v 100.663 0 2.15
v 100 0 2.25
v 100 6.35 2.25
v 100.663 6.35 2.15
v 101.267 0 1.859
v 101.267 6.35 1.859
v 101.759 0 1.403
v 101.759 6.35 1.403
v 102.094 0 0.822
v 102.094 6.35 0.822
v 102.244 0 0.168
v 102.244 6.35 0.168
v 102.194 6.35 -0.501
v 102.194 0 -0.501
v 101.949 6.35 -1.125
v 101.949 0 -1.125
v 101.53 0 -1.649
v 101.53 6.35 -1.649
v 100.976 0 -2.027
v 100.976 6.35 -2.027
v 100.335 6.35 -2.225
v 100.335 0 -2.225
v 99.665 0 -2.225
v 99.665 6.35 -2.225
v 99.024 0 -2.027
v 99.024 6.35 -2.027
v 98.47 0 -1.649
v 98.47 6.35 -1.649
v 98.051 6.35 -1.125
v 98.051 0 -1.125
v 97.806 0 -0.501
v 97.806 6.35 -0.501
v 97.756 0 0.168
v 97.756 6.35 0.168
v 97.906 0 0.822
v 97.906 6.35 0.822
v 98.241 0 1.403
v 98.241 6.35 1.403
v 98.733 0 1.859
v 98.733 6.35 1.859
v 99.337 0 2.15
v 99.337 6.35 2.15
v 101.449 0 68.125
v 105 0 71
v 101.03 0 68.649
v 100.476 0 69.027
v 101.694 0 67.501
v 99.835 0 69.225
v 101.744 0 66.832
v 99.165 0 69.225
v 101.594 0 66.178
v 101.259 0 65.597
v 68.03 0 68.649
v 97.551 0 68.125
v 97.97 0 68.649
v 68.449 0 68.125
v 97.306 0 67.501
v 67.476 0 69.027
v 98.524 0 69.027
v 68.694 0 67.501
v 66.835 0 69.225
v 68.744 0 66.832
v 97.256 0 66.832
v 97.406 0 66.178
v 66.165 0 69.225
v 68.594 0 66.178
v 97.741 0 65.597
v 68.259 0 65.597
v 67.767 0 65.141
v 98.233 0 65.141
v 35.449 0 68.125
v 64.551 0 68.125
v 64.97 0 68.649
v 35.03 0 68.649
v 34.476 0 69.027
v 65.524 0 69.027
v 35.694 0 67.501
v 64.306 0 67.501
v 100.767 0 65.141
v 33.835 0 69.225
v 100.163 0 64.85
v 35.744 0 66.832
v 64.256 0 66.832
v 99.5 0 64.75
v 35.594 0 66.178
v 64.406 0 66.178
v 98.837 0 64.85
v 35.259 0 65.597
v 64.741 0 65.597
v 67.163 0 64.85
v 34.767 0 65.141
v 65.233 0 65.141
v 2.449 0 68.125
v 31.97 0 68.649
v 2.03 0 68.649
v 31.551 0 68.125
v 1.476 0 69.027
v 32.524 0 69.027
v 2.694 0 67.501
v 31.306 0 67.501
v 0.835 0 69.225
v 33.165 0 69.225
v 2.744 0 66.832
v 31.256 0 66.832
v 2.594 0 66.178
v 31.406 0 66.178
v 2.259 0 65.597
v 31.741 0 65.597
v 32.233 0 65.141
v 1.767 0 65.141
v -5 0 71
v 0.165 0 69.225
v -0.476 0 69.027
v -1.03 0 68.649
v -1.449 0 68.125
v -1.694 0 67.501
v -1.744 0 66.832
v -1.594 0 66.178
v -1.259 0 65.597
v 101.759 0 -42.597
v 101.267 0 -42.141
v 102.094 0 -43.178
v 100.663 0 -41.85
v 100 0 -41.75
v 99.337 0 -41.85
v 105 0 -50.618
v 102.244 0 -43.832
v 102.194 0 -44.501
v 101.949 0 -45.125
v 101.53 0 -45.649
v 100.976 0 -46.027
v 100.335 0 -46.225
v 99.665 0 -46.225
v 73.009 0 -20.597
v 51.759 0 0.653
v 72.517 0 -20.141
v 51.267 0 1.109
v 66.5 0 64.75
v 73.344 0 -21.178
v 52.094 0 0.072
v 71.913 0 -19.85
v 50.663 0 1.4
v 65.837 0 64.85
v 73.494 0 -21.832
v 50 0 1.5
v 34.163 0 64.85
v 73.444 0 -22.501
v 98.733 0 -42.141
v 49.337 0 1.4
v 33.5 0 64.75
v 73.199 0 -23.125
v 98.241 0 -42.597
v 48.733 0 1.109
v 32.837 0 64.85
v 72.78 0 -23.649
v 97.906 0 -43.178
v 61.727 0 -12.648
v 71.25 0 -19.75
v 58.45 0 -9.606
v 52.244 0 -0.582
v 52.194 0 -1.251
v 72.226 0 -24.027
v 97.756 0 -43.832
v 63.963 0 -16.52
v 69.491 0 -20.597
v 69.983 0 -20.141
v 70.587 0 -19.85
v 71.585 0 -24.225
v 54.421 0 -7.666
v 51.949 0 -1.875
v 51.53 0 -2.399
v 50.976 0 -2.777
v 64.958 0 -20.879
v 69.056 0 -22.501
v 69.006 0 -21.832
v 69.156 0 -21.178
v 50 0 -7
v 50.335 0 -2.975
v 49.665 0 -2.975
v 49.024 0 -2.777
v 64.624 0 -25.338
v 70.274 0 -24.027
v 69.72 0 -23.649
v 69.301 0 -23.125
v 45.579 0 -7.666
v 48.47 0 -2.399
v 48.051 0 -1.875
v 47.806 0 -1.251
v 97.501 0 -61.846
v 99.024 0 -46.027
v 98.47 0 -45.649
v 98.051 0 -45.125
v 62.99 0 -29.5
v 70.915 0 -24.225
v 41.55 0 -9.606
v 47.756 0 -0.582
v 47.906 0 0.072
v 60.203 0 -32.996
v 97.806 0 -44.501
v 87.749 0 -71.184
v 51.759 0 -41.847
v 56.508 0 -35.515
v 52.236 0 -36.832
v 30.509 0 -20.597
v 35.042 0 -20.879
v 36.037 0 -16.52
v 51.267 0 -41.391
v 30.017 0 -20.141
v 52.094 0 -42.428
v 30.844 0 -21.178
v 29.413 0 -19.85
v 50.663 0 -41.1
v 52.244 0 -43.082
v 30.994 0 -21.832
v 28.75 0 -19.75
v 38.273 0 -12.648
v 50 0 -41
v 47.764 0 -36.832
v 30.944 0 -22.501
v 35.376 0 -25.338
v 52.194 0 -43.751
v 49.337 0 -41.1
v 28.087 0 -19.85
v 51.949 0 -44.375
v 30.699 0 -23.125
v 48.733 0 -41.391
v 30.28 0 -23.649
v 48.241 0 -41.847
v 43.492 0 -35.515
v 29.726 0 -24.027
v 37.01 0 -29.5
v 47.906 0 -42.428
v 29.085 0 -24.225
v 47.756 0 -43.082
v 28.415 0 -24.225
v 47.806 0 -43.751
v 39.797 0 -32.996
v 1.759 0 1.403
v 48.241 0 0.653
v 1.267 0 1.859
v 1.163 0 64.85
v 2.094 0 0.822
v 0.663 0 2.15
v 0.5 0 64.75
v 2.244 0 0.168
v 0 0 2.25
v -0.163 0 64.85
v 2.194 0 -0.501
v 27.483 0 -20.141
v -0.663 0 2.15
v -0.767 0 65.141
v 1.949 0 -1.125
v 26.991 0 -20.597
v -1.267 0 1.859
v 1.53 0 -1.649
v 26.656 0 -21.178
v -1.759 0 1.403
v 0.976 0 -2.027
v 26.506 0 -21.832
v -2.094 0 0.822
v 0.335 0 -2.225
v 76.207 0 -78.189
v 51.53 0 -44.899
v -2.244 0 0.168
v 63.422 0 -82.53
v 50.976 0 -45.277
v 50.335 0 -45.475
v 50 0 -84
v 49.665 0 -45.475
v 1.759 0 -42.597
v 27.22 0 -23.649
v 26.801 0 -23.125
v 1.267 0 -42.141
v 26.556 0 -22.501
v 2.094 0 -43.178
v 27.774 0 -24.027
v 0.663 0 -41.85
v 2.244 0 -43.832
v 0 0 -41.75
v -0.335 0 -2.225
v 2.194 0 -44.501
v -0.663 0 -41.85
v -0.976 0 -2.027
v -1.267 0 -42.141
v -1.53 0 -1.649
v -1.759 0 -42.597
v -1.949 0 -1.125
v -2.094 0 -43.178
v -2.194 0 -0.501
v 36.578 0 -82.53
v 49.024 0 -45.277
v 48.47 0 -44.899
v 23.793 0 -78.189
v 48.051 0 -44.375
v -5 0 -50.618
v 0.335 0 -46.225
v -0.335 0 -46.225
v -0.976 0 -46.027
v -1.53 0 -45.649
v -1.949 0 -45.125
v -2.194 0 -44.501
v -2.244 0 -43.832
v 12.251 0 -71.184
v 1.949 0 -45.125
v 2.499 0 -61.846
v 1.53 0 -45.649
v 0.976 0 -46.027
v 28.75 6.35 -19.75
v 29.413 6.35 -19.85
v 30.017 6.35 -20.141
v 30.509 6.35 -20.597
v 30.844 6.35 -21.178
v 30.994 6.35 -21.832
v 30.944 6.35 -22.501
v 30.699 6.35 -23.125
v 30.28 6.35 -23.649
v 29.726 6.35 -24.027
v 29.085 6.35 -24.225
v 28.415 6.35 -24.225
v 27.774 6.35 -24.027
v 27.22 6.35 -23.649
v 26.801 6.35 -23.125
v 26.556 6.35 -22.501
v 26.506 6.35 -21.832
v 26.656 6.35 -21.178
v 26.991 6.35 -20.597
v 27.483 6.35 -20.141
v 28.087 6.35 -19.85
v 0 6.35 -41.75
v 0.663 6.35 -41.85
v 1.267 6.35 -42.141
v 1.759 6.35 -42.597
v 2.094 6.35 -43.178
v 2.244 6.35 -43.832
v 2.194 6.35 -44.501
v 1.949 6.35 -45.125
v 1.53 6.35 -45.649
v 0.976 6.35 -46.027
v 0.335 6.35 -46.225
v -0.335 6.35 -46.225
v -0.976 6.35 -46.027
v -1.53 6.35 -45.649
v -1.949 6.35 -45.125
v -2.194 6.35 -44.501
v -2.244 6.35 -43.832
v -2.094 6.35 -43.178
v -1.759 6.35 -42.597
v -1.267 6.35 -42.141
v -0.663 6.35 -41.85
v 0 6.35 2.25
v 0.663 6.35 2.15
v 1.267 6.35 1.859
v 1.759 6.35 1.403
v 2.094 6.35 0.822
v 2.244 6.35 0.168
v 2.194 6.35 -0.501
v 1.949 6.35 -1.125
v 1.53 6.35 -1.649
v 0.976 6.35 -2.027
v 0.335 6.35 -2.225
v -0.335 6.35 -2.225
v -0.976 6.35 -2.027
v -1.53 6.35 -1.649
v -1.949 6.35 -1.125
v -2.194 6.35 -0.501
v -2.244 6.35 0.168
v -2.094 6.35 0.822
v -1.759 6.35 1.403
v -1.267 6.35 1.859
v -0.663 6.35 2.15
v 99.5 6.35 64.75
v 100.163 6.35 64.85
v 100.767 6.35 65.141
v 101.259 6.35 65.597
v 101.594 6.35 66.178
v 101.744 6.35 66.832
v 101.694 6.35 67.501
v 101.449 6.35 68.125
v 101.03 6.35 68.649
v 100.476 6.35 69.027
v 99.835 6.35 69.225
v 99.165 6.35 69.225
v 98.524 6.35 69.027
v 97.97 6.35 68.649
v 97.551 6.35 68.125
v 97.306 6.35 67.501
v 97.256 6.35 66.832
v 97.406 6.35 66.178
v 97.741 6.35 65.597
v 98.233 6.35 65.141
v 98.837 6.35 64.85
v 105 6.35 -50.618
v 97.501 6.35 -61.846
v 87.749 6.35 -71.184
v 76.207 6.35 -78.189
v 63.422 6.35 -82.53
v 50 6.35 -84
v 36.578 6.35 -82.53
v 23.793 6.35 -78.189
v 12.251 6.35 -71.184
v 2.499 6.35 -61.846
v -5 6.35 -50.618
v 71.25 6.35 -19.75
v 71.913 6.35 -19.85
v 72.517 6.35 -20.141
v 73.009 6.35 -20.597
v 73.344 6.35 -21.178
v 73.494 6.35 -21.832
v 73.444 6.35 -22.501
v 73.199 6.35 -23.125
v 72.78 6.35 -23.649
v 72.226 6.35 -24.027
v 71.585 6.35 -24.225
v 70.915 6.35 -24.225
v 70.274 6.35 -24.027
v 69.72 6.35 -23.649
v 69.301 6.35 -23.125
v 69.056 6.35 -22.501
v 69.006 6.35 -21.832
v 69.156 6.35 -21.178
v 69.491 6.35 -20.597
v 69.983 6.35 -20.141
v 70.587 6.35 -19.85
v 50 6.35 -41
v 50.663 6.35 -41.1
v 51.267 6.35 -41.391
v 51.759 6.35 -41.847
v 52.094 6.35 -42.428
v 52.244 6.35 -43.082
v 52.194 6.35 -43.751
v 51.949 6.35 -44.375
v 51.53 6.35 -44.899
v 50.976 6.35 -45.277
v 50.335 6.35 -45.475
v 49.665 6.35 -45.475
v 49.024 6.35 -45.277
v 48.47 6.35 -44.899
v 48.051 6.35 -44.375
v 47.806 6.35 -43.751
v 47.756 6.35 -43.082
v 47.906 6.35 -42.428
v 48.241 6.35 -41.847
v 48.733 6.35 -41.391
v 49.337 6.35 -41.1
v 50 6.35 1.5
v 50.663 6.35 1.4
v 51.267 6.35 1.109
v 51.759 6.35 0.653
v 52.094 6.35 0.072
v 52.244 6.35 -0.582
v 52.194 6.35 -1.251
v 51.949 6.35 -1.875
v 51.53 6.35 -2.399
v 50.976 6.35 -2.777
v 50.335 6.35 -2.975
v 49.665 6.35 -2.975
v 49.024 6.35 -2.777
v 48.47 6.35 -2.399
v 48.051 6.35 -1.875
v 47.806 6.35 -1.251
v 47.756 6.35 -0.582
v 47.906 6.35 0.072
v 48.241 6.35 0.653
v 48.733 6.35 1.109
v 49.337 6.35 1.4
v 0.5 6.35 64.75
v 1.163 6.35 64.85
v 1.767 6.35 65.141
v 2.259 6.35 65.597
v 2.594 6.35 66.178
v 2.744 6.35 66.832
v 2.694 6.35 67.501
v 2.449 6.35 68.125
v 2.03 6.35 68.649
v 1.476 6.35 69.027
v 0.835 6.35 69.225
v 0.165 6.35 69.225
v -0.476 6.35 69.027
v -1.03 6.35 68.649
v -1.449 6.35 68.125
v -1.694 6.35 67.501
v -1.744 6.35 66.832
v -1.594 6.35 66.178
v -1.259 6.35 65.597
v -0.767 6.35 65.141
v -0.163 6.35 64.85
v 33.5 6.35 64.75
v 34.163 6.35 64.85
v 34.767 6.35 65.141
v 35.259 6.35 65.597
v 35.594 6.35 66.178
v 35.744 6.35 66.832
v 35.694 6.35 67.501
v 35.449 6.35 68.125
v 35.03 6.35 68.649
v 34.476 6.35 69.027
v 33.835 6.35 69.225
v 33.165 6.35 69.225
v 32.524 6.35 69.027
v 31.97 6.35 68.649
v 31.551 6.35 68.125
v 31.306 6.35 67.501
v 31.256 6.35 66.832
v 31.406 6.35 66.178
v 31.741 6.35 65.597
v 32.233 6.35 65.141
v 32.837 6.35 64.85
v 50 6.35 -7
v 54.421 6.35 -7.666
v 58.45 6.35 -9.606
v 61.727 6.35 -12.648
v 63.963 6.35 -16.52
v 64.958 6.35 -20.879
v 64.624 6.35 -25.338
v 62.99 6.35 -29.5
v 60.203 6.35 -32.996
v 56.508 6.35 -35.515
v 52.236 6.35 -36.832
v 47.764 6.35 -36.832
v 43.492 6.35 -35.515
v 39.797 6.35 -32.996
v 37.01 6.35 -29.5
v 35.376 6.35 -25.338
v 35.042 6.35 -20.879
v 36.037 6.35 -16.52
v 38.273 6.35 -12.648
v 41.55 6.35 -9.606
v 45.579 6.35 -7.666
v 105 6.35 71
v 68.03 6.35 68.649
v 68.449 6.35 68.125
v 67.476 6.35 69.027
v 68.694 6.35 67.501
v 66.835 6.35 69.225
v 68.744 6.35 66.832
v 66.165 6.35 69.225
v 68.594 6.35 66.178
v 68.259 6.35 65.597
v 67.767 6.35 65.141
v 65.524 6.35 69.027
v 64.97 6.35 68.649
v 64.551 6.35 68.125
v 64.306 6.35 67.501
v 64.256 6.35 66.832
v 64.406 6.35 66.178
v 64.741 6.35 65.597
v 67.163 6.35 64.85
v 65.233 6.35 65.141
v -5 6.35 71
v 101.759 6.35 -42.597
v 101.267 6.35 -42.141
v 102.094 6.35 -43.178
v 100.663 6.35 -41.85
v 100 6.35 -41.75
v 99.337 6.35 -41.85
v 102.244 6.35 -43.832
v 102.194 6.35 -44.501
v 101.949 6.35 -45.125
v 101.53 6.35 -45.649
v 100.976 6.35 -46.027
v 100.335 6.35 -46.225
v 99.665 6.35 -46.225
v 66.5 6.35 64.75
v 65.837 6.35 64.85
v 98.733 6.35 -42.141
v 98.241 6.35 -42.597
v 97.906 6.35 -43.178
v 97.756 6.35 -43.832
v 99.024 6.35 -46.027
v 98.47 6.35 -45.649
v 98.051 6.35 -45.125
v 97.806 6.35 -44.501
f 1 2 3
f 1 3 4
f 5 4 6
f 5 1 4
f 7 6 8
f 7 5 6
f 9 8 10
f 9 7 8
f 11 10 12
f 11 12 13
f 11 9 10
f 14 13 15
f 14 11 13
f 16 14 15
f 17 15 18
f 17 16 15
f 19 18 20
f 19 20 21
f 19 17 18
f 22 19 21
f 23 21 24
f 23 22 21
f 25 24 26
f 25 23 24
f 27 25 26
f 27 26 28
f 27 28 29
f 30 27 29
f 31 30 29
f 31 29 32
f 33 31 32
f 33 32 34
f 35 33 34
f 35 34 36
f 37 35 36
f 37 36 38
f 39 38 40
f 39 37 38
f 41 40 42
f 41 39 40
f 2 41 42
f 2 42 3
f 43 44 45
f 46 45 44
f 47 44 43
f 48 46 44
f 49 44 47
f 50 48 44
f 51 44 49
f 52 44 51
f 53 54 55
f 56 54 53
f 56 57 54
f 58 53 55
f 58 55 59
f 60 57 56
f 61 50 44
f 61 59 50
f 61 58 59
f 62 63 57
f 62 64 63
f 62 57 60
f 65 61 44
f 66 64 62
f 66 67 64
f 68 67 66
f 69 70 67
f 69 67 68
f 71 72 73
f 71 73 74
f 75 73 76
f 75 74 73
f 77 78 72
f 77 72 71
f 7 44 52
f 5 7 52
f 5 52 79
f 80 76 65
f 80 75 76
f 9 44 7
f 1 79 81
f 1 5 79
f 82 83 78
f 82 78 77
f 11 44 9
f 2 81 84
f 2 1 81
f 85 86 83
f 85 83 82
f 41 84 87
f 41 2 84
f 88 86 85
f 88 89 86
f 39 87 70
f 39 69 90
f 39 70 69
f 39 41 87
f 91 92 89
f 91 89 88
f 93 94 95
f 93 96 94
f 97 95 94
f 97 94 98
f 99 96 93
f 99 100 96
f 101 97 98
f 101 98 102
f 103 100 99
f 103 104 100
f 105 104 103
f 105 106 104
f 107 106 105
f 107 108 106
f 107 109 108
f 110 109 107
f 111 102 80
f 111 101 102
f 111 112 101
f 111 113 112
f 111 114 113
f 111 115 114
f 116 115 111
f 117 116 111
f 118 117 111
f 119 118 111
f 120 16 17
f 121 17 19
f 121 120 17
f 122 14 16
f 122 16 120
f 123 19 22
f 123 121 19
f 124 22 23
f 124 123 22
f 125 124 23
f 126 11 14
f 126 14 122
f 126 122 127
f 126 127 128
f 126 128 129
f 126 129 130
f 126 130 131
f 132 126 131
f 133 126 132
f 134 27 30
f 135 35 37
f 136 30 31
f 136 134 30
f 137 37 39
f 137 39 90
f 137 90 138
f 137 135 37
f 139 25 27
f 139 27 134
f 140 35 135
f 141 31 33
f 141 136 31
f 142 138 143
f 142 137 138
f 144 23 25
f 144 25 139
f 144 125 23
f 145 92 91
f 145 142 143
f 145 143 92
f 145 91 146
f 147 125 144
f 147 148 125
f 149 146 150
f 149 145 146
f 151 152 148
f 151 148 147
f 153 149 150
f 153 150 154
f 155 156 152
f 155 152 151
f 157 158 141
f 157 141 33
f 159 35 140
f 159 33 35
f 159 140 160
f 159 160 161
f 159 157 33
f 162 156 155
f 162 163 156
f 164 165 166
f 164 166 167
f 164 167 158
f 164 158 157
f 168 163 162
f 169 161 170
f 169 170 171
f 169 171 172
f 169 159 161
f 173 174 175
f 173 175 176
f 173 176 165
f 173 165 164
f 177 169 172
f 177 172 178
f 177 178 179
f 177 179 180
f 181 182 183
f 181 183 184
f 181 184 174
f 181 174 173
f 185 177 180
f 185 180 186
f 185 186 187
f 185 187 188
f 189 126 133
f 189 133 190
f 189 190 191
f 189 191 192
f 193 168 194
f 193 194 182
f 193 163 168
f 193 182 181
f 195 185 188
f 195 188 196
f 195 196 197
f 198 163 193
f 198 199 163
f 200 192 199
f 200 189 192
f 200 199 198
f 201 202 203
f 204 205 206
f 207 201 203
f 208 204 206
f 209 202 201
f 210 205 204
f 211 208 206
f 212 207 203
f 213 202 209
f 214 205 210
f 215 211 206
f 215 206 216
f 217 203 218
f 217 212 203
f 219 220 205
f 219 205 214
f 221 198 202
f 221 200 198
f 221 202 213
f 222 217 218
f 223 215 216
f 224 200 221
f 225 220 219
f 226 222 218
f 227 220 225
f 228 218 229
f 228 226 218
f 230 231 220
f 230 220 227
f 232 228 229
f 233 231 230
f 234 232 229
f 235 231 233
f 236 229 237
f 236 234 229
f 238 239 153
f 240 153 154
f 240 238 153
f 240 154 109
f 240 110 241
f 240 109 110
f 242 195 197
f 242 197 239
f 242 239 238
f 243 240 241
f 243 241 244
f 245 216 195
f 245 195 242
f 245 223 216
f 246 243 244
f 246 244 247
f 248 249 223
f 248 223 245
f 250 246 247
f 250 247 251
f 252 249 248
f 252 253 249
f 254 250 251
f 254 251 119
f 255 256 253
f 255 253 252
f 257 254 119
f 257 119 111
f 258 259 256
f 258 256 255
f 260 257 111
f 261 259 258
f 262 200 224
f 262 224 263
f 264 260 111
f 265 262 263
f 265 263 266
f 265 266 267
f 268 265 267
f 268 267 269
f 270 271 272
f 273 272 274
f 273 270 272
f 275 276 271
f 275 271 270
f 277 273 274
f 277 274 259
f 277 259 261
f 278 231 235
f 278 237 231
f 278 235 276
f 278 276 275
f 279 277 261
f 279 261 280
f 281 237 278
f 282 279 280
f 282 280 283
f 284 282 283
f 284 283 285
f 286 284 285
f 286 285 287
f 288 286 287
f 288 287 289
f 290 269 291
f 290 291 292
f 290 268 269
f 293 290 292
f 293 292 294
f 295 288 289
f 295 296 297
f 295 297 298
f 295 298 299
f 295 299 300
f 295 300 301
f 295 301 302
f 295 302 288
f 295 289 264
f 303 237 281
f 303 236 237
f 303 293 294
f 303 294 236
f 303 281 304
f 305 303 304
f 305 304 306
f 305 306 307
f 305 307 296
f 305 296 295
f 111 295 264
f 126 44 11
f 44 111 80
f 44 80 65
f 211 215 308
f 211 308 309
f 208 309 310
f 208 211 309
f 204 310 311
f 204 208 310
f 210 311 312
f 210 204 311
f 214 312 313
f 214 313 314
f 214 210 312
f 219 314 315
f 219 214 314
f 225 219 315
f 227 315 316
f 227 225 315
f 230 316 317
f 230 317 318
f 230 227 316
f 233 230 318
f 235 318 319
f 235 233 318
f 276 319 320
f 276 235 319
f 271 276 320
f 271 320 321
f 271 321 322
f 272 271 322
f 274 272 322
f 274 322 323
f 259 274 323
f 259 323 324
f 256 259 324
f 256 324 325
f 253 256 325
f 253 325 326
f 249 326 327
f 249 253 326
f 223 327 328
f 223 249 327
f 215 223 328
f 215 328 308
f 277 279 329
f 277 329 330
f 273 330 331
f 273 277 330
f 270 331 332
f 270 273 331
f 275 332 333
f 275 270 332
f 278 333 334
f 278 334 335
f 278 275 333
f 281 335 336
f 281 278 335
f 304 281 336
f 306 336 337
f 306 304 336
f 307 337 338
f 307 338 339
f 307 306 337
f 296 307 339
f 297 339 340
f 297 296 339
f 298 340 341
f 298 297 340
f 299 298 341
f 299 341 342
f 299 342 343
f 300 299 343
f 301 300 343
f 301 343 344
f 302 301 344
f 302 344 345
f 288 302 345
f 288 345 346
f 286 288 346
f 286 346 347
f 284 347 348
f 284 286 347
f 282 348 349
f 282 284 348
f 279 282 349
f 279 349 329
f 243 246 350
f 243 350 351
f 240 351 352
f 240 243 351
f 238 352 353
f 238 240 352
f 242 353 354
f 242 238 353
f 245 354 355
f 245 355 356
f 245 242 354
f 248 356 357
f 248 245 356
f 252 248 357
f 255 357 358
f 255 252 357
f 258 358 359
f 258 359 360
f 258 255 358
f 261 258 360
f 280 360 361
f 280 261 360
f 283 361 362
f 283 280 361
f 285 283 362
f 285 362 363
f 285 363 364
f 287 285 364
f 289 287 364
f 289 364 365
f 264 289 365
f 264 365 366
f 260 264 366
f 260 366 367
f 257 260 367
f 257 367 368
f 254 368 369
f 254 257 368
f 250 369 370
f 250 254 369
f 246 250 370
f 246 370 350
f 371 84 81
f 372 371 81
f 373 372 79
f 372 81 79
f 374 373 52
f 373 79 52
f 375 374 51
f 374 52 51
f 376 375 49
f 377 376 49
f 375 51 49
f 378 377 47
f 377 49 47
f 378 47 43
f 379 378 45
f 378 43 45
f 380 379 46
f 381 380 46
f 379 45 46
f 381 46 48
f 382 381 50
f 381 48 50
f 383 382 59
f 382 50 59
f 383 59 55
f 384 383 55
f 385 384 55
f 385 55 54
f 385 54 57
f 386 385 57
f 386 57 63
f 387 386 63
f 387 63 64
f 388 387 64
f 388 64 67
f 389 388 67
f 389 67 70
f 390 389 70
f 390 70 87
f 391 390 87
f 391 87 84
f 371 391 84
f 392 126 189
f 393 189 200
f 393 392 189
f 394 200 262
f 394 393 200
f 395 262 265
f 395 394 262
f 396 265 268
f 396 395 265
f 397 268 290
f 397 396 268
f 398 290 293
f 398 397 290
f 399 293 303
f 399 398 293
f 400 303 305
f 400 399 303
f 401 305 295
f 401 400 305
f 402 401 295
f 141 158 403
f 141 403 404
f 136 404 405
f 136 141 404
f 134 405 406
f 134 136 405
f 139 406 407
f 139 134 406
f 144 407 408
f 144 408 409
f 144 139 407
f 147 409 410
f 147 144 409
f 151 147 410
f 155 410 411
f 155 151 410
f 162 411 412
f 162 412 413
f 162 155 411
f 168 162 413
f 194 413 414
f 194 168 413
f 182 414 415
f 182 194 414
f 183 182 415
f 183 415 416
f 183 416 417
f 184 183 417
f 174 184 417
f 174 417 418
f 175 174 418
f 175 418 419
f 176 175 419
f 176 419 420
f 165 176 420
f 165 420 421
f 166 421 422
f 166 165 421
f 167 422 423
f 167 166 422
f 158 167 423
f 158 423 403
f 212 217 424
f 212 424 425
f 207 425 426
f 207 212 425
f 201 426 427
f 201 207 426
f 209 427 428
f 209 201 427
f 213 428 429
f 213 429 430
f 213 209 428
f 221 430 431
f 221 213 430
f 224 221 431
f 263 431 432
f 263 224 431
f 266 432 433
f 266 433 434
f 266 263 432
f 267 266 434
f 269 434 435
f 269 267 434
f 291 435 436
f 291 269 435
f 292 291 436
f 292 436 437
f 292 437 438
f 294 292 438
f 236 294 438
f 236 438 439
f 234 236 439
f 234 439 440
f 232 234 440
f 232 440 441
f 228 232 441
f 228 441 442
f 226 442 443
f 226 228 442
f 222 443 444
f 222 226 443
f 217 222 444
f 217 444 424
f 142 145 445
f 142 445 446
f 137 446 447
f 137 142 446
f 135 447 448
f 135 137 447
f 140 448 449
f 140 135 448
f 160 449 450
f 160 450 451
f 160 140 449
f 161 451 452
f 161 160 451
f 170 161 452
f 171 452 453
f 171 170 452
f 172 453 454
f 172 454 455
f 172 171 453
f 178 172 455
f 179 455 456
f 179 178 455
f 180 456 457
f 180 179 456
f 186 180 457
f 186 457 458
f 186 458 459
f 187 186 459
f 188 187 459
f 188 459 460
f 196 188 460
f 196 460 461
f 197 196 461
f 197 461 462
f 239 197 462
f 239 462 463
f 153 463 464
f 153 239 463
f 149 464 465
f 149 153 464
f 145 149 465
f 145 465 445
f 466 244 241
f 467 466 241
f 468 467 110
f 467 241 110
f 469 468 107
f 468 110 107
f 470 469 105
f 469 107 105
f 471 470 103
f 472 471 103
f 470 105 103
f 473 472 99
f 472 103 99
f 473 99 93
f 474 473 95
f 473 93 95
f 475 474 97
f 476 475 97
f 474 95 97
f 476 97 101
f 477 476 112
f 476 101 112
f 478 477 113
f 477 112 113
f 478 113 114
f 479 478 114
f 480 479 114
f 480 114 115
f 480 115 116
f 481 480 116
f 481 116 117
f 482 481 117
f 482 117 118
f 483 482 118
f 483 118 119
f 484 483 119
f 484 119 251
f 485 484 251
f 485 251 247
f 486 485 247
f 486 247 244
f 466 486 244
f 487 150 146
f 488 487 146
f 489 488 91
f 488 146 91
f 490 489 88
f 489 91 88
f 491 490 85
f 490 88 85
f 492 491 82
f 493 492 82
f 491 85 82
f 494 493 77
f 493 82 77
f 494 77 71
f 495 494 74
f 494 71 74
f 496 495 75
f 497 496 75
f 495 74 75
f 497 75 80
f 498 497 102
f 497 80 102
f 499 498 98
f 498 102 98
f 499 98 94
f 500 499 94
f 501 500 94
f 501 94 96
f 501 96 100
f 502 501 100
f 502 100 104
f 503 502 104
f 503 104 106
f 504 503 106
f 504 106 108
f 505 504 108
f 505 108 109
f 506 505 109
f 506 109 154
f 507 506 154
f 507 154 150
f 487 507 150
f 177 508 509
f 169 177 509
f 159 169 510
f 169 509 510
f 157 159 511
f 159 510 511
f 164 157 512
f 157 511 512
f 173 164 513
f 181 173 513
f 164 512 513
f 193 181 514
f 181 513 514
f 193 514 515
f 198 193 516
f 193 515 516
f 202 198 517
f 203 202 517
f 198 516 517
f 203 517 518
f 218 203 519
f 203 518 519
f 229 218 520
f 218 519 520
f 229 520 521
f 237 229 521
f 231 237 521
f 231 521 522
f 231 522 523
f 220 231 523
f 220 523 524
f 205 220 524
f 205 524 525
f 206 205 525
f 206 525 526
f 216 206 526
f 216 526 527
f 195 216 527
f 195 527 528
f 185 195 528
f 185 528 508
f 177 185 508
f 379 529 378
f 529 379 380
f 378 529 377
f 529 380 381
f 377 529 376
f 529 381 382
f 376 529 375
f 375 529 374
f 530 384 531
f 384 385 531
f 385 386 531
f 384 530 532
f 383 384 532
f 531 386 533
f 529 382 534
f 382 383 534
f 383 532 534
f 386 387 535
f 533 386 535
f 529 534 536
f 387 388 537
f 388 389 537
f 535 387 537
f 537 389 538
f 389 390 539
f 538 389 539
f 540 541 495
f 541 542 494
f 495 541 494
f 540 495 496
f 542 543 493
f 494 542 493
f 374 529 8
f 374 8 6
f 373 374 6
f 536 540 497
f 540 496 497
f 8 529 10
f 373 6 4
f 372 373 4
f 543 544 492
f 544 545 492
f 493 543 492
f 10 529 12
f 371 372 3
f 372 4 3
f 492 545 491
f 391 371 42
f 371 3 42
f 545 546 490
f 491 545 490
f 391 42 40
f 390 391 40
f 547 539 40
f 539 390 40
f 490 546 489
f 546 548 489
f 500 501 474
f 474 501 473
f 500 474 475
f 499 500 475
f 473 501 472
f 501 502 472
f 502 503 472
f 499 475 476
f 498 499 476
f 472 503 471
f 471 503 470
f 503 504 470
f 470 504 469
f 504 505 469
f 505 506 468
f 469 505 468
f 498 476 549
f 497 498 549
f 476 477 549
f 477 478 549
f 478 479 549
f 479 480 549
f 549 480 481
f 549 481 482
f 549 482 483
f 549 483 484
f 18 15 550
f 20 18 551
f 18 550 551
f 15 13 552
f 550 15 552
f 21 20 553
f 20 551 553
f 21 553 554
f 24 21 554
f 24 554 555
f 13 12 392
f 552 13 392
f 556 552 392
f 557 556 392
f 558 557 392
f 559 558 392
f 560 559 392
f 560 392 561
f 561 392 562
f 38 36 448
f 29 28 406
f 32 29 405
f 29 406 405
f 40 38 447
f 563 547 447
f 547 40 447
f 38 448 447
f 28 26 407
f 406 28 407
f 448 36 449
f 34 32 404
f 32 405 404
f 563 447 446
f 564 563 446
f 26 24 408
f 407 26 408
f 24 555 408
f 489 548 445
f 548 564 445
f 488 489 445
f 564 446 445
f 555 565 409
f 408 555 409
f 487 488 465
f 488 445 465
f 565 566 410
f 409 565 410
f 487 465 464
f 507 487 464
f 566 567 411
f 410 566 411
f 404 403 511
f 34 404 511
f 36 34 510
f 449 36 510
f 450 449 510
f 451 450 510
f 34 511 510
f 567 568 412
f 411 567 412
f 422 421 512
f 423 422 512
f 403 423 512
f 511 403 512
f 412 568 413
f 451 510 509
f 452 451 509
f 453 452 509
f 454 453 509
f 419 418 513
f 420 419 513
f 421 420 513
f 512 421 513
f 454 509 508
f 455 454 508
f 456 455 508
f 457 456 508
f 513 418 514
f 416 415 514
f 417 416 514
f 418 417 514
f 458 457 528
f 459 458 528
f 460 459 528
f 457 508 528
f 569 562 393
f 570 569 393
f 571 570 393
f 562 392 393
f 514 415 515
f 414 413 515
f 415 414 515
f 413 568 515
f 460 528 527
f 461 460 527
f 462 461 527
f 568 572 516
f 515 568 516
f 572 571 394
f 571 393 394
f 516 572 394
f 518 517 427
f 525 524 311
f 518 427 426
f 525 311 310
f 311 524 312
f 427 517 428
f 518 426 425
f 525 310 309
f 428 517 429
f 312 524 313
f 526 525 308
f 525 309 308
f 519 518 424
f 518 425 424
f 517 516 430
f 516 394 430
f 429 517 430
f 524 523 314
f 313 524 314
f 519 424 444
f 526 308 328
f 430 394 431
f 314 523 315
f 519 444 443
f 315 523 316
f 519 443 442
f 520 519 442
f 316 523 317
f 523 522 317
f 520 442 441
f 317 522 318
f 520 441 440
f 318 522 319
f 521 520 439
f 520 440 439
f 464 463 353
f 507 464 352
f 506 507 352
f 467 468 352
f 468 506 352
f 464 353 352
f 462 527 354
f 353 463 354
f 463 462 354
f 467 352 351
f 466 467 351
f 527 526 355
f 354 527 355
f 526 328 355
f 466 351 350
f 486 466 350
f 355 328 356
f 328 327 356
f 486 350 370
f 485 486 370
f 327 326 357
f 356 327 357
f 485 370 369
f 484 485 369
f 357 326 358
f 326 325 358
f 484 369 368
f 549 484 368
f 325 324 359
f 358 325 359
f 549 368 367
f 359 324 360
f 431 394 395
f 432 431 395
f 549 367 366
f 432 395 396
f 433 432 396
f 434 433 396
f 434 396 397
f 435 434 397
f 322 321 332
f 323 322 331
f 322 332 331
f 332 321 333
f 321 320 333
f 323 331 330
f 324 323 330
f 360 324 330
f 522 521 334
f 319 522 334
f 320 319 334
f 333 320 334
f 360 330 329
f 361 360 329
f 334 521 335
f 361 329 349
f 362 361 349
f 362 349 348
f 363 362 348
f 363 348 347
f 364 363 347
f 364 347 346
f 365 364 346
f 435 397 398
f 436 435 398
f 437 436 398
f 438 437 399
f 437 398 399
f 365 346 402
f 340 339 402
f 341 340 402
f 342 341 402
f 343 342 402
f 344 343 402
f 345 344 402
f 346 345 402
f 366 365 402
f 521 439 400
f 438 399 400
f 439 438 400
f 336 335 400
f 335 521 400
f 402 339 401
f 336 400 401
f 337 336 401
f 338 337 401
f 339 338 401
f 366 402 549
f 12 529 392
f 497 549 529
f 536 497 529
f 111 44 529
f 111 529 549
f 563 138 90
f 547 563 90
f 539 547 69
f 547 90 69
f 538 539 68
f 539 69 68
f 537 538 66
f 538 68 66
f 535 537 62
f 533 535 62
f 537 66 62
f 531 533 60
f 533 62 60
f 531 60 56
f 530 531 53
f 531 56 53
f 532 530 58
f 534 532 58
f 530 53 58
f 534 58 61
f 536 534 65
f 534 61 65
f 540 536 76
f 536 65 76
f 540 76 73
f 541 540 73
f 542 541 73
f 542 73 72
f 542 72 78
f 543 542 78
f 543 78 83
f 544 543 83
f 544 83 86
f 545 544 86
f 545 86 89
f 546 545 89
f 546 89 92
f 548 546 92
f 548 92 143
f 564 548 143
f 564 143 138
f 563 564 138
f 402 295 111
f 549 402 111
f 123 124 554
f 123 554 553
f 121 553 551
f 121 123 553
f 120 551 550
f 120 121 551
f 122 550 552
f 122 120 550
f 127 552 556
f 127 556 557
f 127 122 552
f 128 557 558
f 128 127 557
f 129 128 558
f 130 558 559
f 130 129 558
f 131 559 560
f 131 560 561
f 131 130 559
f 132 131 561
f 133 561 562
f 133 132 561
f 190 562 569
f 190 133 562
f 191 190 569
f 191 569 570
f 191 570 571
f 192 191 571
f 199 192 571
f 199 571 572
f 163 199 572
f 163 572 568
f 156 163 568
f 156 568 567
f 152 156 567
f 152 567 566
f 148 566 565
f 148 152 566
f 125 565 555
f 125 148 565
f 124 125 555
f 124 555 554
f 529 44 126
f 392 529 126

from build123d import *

# Parameters (mm, degrees)
SKETCH1_R           = 2.25
BOSS_EXTRUDE1_DEPTH = 6.35
SKETCH2_R           = 15
CUT_EXTRUDE1_DEPTH  = 10
CUT_EXTRUDE2_DEPTH  = 60
SKETCH4_R           = 2.25
CUT_EXTRUDE3_DEPTH  = 10


with BuildPart() as part:
    # Sketch1 → Boss-Extrude1 (new body)
    with BuildSketch(Plane(origin=(0, 0, 0), x_dir=(1, 0, 0), z_dir=(0, 1, 0))):
        Polygon((-5, -16), (-5, 84), (105, 84), (105, -16), (105, -71), (-5, -71), align=None)
        with Locations(Location((0, 0, 0), (0, 0, 270))):
            Circle(SKETCH1_R, mode=Mode.SUBTRACT)
        with Locations(Location((0, 44, 0), (0, 0, 270))):
            Circle(SKETCH1_R, mode=Mode.SUBTRACT)
        with Locations(Location((100, 44, 0), (0, 0, 270))):
            Circle(SKETCH1_R, mode=Mode.SUBTRACT)
        with Locations(Location((100, 0, 0), (0, 0, 270))):
            Circle(SKETCH1_R, mode=Mode.SUBTRACT)
        with Locations(Location((50, 43.25, 0), (0, 0, 270))):
            Circle(SKETCH1_R, mode=Mode.SUBTRACT)
        with Locations(Location((71.25, 22, 0), (0, 0, 270))):
            Circle(SKETCH1_R, mode=Mode.SUBTRACT)
        with Locations(Location((50, 0.75, 0), (0, 0, 270))):
            Circle(SKETCH1_R, mode=Mode.SUBTRACT)
        with Locations(Location((28.75, 22, 0), (0, 0, 270))):
            Circle(SKETCH1_R, mode=Mode.SUBTRACT)
    extrude(amount=BOSS_EXTRUDE1_DEPTH)

    # Sketch2 → Cut-Extrude1 (cut)
    with BuildSketch(Plane(origin=(0, 6.35, 0), x_dir=(1, 0, 0), z_dir=(0, 1, 0))):
        with Locations(Location((50, 22, 0), (0, 0, 270))):
            Circle(SKETCH2_R)
    extrude(amount=-CUT_EXTRUDE1_DEPTH, mode=Mode.SUBTRACT)

    # Sketch3 → Cut-Extrude2 (cut)
    with BuildSketch(Plane(origin=(0, 6.35, 0), x_dir=(1, 0, 0), z_dir=(0, 1, 0))):
        with BuildLine():
            Line((-11.87928751, 18.13298859), (-19.122468025, 134.037184903))
            Line((-19.122468025, 134.037184903), (176.364402691, 135.714155607))
            Line((176.364402691, 135.714155607), (111.227525883, 31.756540076))
            ThreePointArc((111.227525883, 31.756540076), (43.180433513, 83.623806381), (-11.87928751, 18.13298859))
        make_face()
    extrude(amount=-CUT_EXTRUDE2_DEPTH, mode=Mode.SUBTRACT)

    # Sketch4 → Cut-Extrude3 (cut)
    with BuildSketch(Plane.XZ):
        with Locations(Location((99.5, 67, 0), (0, 0, 270))):
            Circle(SKETCH4_R)
        with Locations(Location((0.5, 67, 0), (0, 0, 270))):
            Circle(SKETCH4_R)
        with Locations(Location((33.5, 67, 0), (0, 0, 270))):
            Circle(SKETCH4_R)
        with Locations(Location((66.5, 67, 0), (0, 0, 270))):
            Circle(SKETCH4_R)
    extrude(amount=-CUT_EXTRUDE3_DEPTH, mode=Mode.SUBTRACT)


solid = part.part
